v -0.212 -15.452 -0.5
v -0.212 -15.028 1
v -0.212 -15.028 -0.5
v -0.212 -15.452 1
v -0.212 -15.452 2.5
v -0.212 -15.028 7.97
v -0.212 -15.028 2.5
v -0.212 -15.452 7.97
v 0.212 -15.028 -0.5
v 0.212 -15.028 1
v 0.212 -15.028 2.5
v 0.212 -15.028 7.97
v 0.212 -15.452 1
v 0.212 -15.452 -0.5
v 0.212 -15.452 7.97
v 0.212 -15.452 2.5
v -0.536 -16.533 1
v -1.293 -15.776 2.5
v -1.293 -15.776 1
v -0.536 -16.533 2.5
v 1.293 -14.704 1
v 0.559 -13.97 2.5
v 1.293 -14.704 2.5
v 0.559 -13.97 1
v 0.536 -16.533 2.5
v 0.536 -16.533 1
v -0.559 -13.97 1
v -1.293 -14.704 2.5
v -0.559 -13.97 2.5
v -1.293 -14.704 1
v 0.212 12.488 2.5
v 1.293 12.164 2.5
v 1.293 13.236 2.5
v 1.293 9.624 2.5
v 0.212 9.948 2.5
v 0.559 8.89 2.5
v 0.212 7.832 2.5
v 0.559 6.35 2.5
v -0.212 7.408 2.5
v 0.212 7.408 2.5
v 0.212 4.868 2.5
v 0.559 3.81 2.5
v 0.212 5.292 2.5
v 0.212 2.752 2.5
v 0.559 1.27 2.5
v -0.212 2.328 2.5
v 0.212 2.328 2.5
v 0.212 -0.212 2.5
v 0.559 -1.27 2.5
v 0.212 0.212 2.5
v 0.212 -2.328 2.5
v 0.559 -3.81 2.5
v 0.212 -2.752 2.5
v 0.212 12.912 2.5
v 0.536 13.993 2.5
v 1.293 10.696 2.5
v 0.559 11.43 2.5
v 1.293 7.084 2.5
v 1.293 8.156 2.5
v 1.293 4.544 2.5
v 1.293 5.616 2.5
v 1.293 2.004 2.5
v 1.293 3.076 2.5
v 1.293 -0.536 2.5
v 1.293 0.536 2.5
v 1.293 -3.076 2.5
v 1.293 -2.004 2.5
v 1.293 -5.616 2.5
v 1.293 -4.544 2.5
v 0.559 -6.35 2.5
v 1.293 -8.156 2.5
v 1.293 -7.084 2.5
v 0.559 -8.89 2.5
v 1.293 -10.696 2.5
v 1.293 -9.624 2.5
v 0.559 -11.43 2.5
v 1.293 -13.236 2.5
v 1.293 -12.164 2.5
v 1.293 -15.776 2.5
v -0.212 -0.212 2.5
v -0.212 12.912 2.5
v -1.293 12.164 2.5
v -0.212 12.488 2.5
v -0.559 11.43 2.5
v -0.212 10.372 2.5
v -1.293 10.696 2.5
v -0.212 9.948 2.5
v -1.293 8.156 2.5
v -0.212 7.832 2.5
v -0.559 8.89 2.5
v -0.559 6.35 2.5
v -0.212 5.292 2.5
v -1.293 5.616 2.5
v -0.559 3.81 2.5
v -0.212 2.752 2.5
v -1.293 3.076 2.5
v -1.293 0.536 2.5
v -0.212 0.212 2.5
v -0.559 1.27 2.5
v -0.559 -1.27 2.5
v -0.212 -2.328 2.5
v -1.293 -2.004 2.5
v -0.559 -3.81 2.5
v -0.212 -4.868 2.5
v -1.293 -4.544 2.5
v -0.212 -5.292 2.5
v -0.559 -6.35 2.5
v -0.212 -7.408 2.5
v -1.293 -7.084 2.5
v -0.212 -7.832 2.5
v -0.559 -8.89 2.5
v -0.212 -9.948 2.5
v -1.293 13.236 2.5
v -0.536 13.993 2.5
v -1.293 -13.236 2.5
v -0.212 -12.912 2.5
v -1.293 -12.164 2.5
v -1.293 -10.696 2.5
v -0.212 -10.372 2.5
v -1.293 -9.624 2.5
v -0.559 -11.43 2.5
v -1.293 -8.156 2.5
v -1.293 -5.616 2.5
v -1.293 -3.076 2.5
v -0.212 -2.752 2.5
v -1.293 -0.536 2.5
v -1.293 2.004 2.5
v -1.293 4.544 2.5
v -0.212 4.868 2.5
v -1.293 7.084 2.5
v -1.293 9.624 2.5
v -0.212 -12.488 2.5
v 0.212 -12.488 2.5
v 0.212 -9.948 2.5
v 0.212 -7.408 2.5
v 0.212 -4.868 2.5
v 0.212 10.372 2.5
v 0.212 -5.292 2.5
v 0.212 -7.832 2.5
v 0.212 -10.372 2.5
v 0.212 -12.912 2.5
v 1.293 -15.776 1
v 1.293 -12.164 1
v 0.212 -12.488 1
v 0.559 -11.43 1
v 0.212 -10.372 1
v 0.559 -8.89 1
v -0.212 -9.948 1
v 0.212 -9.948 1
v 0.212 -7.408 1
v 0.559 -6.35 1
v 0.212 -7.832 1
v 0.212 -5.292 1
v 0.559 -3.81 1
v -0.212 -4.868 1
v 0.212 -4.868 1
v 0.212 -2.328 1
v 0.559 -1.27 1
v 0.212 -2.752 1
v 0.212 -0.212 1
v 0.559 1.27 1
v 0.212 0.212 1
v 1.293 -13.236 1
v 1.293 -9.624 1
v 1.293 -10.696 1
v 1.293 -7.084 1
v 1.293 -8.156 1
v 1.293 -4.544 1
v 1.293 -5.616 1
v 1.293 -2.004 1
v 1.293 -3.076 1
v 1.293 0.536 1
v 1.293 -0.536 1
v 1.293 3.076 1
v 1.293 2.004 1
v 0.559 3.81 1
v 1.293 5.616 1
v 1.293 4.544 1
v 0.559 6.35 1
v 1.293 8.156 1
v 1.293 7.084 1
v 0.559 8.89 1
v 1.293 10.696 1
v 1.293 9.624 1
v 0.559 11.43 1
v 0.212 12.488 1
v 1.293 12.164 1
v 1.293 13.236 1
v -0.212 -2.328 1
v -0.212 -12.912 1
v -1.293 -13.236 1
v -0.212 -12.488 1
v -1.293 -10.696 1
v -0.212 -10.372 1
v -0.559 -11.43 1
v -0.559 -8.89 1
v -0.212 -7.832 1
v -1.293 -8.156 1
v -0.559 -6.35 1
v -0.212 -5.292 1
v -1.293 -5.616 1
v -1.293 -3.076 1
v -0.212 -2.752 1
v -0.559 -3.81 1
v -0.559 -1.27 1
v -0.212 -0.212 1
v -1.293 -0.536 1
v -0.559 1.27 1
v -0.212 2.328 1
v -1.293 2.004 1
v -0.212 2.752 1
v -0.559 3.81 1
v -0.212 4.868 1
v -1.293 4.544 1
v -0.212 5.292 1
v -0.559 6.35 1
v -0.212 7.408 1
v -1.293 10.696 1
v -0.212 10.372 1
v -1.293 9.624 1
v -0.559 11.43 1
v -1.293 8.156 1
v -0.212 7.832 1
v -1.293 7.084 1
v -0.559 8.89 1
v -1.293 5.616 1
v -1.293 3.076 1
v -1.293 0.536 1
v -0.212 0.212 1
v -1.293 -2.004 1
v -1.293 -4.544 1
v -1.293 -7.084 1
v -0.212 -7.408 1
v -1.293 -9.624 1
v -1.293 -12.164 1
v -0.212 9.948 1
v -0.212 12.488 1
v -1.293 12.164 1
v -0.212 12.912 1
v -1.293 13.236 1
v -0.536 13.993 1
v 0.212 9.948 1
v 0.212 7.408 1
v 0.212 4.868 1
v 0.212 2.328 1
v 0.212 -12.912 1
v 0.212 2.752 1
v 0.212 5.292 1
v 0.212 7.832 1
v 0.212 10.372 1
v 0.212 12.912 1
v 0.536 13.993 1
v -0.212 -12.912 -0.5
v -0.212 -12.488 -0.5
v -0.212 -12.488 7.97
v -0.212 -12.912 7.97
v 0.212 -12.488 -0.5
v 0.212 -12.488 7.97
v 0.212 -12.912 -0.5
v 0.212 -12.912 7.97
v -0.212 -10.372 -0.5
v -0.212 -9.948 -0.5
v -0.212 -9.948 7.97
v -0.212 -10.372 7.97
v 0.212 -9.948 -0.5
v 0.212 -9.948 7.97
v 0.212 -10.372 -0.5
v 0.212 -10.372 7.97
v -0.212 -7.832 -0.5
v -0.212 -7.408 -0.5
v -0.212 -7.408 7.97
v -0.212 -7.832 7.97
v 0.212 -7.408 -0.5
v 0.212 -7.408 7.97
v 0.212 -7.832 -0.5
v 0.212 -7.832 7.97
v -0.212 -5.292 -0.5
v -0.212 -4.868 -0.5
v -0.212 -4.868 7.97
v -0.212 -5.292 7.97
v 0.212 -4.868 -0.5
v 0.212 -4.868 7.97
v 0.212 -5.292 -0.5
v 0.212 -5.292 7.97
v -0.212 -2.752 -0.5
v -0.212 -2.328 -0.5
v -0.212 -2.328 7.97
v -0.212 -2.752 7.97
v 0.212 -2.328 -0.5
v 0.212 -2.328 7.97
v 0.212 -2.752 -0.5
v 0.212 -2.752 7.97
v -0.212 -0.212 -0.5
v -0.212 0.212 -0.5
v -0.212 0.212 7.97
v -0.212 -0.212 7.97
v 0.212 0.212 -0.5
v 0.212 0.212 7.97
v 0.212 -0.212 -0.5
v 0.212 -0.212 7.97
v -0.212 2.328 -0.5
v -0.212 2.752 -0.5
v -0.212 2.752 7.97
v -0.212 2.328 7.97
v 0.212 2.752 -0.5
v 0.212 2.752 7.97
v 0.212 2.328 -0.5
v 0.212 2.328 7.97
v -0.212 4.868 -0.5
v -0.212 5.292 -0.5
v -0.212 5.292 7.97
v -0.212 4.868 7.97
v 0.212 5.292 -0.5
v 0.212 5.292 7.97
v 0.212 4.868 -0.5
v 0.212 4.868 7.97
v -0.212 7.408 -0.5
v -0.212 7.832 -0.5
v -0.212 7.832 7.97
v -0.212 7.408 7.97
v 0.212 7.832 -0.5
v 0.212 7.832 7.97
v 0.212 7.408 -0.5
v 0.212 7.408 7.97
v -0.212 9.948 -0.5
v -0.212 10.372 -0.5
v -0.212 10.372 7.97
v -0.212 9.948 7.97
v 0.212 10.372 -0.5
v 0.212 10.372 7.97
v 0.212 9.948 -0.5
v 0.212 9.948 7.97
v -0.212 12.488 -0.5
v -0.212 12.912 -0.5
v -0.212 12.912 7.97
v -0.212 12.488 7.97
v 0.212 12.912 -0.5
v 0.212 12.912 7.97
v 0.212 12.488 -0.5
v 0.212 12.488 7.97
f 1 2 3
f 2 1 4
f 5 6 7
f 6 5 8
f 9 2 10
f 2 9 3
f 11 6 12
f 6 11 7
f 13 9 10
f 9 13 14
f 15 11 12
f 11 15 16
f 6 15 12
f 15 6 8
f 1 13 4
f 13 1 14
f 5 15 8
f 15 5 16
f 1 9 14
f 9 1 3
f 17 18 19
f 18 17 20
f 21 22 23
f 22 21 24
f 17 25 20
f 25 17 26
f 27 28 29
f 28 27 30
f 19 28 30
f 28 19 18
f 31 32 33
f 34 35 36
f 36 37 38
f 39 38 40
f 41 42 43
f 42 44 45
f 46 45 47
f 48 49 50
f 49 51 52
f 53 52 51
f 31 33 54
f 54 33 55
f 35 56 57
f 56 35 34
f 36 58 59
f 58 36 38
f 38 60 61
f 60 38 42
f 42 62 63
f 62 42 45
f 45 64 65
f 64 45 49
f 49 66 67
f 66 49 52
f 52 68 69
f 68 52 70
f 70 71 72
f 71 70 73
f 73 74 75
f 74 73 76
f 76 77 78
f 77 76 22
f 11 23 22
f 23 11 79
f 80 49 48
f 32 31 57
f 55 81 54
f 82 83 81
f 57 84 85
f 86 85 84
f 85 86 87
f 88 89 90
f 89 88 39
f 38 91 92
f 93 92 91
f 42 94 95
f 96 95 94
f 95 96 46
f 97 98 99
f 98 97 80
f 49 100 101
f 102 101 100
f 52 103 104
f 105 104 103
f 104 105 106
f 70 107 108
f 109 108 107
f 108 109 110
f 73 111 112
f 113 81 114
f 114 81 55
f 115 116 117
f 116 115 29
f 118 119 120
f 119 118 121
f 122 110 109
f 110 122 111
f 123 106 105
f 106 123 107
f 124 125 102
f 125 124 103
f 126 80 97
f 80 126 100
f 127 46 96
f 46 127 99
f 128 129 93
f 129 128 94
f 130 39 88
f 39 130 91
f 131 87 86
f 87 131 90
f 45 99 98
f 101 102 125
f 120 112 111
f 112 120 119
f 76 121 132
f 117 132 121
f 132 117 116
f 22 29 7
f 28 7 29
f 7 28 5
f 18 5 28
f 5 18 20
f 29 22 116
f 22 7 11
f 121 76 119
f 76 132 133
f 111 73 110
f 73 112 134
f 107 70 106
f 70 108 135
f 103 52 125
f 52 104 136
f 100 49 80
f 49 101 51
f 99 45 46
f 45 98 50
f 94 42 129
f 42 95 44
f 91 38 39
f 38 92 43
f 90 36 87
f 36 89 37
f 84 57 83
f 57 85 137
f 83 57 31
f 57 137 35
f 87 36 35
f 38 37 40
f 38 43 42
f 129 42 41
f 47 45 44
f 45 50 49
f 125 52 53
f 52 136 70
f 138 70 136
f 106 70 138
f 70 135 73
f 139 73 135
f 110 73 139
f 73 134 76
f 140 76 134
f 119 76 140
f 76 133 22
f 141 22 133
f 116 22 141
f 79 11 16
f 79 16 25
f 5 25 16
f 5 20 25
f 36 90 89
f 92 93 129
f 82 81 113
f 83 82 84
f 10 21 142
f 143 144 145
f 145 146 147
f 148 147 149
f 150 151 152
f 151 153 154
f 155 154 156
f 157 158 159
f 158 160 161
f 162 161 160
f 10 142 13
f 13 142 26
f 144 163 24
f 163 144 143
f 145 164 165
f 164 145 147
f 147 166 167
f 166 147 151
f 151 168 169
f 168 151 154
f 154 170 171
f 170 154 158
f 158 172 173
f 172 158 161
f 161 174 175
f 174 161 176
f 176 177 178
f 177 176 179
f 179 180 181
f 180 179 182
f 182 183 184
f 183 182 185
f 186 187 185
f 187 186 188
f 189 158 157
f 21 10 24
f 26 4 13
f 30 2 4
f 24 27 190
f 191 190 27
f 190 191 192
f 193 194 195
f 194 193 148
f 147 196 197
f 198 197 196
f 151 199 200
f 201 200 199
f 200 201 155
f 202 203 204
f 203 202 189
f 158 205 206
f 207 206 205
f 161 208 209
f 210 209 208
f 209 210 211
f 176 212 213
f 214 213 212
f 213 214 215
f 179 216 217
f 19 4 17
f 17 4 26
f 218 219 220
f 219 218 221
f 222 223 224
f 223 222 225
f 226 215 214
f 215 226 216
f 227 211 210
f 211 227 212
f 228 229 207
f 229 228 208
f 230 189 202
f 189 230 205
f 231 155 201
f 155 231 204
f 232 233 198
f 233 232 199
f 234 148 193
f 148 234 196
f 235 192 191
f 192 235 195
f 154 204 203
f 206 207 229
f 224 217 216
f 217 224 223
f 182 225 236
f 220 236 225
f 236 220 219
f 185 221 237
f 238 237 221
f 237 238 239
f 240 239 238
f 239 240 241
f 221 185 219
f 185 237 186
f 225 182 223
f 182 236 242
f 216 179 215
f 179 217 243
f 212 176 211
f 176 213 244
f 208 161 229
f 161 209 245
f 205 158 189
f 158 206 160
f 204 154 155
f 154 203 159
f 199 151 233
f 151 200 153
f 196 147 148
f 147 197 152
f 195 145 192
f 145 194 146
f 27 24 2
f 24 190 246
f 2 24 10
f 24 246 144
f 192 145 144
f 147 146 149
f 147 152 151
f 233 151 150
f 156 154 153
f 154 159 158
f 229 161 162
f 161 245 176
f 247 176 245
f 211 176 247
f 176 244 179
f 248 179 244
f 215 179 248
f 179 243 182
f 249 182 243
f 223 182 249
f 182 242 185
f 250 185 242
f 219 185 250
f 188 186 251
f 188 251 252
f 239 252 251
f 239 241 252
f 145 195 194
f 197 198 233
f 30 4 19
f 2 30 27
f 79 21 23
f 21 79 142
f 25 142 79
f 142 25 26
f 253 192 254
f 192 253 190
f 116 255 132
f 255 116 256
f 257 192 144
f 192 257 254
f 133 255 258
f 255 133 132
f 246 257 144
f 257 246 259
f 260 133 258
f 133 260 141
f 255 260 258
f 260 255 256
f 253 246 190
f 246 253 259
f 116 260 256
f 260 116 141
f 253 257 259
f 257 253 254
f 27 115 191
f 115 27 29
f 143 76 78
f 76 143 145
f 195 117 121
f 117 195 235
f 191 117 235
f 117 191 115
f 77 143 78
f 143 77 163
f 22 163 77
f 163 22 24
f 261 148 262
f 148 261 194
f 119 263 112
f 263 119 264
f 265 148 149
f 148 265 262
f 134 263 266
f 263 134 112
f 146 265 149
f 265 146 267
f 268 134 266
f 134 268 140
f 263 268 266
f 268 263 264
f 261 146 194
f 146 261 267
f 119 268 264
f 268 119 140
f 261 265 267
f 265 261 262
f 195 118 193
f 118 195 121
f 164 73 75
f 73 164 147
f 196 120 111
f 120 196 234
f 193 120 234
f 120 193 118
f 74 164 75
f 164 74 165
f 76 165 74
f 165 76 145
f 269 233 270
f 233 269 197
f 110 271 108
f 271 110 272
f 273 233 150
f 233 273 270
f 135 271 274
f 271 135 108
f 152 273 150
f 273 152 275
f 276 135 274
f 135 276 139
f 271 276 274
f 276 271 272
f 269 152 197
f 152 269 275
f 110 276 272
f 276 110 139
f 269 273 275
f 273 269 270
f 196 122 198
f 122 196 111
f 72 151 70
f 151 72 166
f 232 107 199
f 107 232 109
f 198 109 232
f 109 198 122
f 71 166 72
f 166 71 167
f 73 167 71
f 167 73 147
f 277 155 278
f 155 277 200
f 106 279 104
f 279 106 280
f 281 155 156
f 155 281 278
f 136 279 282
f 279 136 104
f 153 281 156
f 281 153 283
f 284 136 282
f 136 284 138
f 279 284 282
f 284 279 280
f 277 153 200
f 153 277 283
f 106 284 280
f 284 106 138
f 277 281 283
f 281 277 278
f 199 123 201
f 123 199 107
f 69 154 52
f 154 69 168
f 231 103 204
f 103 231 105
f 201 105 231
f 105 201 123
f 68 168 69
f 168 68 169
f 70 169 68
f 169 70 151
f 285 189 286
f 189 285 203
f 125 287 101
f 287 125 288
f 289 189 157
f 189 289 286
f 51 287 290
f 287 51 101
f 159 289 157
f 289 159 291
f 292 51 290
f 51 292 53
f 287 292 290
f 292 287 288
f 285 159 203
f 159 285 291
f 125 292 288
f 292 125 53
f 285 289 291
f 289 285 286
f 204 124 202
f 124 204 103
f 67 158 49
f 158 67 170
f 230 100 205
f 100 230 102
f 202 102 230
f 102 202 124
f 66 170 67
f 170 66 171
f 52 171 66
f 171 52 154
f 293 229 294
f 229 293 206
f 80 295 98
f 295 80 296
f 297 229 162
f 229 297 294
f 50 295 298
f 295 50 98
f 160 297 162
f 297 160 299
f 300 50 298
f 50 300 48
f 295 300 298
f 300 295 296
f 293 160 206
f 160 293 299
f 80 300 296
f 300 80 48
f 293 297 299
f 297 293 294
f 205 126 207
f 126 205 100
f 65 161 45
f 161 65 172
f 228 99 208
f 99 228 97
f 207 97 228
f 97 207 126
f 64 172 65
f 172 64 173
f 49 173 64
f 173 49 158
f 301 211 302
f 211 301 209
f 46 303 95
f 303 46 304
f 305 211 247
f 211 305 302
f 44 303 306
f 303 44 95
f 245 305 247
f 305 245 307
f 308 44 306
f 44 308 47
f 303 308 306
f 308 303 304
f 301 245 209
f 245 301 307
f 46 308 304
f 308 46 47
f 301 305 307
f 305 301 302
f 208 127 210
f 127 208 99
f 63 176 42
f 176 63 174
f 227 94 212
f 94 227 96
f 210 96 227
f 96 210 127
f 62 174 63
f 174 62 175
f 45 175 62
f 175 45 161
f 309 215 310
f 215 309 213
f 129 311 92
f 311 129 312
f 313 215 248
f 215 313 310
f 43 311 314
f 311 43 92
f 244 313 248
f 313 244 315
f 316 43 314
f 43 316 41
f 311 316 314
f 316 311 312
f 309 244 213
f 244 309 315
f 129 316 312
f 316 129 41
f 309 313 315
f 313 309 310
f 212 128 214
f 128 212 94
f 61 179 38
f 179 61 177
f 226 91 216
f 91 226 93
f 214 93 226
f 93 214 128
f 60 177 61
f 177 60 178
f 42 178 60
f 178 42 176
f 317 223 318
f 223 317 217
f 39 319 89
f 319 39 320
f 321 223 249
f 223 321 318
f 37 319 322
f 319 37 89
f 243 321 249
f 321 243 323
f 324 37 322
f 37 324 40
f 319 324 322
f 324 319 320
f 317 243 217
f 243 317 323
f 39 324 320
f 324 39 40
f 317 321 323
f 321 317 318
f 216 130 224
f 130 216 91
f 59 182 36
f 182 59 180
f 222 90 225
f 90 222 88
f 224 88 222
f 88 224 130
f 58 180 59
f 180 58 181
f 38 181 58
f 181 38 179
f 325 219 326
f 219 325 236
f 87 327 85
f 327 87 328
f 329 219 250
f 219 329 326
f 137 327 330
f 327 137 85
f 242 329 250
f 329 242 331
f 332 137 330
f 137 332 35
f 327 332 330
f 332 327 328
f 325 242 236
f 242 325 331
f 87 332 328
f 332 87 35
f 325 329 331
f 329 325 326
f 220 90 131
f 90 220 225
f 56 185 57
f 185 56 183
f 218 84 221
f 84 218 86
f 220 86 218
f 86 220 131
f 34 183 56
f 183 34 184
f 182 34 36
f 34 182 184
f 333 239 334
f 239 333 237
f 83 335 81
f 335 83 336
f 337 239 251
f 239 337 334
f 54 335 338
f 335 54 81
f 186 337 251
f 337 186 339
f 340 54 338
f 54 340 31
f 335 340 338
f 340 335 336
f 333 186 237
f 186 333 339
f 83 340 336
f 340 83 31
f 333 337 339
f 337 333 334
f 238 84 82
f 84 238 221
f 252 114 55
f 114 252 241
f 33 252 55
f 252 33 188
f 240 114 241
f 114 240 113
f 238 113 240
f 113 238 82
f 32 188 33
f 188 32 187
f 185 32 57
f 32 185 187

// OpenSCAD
use <parts.scad>;

for (pin = [-6:5]) {
    translate([0, 2.54 * pin, 0]) goldpin();
}
